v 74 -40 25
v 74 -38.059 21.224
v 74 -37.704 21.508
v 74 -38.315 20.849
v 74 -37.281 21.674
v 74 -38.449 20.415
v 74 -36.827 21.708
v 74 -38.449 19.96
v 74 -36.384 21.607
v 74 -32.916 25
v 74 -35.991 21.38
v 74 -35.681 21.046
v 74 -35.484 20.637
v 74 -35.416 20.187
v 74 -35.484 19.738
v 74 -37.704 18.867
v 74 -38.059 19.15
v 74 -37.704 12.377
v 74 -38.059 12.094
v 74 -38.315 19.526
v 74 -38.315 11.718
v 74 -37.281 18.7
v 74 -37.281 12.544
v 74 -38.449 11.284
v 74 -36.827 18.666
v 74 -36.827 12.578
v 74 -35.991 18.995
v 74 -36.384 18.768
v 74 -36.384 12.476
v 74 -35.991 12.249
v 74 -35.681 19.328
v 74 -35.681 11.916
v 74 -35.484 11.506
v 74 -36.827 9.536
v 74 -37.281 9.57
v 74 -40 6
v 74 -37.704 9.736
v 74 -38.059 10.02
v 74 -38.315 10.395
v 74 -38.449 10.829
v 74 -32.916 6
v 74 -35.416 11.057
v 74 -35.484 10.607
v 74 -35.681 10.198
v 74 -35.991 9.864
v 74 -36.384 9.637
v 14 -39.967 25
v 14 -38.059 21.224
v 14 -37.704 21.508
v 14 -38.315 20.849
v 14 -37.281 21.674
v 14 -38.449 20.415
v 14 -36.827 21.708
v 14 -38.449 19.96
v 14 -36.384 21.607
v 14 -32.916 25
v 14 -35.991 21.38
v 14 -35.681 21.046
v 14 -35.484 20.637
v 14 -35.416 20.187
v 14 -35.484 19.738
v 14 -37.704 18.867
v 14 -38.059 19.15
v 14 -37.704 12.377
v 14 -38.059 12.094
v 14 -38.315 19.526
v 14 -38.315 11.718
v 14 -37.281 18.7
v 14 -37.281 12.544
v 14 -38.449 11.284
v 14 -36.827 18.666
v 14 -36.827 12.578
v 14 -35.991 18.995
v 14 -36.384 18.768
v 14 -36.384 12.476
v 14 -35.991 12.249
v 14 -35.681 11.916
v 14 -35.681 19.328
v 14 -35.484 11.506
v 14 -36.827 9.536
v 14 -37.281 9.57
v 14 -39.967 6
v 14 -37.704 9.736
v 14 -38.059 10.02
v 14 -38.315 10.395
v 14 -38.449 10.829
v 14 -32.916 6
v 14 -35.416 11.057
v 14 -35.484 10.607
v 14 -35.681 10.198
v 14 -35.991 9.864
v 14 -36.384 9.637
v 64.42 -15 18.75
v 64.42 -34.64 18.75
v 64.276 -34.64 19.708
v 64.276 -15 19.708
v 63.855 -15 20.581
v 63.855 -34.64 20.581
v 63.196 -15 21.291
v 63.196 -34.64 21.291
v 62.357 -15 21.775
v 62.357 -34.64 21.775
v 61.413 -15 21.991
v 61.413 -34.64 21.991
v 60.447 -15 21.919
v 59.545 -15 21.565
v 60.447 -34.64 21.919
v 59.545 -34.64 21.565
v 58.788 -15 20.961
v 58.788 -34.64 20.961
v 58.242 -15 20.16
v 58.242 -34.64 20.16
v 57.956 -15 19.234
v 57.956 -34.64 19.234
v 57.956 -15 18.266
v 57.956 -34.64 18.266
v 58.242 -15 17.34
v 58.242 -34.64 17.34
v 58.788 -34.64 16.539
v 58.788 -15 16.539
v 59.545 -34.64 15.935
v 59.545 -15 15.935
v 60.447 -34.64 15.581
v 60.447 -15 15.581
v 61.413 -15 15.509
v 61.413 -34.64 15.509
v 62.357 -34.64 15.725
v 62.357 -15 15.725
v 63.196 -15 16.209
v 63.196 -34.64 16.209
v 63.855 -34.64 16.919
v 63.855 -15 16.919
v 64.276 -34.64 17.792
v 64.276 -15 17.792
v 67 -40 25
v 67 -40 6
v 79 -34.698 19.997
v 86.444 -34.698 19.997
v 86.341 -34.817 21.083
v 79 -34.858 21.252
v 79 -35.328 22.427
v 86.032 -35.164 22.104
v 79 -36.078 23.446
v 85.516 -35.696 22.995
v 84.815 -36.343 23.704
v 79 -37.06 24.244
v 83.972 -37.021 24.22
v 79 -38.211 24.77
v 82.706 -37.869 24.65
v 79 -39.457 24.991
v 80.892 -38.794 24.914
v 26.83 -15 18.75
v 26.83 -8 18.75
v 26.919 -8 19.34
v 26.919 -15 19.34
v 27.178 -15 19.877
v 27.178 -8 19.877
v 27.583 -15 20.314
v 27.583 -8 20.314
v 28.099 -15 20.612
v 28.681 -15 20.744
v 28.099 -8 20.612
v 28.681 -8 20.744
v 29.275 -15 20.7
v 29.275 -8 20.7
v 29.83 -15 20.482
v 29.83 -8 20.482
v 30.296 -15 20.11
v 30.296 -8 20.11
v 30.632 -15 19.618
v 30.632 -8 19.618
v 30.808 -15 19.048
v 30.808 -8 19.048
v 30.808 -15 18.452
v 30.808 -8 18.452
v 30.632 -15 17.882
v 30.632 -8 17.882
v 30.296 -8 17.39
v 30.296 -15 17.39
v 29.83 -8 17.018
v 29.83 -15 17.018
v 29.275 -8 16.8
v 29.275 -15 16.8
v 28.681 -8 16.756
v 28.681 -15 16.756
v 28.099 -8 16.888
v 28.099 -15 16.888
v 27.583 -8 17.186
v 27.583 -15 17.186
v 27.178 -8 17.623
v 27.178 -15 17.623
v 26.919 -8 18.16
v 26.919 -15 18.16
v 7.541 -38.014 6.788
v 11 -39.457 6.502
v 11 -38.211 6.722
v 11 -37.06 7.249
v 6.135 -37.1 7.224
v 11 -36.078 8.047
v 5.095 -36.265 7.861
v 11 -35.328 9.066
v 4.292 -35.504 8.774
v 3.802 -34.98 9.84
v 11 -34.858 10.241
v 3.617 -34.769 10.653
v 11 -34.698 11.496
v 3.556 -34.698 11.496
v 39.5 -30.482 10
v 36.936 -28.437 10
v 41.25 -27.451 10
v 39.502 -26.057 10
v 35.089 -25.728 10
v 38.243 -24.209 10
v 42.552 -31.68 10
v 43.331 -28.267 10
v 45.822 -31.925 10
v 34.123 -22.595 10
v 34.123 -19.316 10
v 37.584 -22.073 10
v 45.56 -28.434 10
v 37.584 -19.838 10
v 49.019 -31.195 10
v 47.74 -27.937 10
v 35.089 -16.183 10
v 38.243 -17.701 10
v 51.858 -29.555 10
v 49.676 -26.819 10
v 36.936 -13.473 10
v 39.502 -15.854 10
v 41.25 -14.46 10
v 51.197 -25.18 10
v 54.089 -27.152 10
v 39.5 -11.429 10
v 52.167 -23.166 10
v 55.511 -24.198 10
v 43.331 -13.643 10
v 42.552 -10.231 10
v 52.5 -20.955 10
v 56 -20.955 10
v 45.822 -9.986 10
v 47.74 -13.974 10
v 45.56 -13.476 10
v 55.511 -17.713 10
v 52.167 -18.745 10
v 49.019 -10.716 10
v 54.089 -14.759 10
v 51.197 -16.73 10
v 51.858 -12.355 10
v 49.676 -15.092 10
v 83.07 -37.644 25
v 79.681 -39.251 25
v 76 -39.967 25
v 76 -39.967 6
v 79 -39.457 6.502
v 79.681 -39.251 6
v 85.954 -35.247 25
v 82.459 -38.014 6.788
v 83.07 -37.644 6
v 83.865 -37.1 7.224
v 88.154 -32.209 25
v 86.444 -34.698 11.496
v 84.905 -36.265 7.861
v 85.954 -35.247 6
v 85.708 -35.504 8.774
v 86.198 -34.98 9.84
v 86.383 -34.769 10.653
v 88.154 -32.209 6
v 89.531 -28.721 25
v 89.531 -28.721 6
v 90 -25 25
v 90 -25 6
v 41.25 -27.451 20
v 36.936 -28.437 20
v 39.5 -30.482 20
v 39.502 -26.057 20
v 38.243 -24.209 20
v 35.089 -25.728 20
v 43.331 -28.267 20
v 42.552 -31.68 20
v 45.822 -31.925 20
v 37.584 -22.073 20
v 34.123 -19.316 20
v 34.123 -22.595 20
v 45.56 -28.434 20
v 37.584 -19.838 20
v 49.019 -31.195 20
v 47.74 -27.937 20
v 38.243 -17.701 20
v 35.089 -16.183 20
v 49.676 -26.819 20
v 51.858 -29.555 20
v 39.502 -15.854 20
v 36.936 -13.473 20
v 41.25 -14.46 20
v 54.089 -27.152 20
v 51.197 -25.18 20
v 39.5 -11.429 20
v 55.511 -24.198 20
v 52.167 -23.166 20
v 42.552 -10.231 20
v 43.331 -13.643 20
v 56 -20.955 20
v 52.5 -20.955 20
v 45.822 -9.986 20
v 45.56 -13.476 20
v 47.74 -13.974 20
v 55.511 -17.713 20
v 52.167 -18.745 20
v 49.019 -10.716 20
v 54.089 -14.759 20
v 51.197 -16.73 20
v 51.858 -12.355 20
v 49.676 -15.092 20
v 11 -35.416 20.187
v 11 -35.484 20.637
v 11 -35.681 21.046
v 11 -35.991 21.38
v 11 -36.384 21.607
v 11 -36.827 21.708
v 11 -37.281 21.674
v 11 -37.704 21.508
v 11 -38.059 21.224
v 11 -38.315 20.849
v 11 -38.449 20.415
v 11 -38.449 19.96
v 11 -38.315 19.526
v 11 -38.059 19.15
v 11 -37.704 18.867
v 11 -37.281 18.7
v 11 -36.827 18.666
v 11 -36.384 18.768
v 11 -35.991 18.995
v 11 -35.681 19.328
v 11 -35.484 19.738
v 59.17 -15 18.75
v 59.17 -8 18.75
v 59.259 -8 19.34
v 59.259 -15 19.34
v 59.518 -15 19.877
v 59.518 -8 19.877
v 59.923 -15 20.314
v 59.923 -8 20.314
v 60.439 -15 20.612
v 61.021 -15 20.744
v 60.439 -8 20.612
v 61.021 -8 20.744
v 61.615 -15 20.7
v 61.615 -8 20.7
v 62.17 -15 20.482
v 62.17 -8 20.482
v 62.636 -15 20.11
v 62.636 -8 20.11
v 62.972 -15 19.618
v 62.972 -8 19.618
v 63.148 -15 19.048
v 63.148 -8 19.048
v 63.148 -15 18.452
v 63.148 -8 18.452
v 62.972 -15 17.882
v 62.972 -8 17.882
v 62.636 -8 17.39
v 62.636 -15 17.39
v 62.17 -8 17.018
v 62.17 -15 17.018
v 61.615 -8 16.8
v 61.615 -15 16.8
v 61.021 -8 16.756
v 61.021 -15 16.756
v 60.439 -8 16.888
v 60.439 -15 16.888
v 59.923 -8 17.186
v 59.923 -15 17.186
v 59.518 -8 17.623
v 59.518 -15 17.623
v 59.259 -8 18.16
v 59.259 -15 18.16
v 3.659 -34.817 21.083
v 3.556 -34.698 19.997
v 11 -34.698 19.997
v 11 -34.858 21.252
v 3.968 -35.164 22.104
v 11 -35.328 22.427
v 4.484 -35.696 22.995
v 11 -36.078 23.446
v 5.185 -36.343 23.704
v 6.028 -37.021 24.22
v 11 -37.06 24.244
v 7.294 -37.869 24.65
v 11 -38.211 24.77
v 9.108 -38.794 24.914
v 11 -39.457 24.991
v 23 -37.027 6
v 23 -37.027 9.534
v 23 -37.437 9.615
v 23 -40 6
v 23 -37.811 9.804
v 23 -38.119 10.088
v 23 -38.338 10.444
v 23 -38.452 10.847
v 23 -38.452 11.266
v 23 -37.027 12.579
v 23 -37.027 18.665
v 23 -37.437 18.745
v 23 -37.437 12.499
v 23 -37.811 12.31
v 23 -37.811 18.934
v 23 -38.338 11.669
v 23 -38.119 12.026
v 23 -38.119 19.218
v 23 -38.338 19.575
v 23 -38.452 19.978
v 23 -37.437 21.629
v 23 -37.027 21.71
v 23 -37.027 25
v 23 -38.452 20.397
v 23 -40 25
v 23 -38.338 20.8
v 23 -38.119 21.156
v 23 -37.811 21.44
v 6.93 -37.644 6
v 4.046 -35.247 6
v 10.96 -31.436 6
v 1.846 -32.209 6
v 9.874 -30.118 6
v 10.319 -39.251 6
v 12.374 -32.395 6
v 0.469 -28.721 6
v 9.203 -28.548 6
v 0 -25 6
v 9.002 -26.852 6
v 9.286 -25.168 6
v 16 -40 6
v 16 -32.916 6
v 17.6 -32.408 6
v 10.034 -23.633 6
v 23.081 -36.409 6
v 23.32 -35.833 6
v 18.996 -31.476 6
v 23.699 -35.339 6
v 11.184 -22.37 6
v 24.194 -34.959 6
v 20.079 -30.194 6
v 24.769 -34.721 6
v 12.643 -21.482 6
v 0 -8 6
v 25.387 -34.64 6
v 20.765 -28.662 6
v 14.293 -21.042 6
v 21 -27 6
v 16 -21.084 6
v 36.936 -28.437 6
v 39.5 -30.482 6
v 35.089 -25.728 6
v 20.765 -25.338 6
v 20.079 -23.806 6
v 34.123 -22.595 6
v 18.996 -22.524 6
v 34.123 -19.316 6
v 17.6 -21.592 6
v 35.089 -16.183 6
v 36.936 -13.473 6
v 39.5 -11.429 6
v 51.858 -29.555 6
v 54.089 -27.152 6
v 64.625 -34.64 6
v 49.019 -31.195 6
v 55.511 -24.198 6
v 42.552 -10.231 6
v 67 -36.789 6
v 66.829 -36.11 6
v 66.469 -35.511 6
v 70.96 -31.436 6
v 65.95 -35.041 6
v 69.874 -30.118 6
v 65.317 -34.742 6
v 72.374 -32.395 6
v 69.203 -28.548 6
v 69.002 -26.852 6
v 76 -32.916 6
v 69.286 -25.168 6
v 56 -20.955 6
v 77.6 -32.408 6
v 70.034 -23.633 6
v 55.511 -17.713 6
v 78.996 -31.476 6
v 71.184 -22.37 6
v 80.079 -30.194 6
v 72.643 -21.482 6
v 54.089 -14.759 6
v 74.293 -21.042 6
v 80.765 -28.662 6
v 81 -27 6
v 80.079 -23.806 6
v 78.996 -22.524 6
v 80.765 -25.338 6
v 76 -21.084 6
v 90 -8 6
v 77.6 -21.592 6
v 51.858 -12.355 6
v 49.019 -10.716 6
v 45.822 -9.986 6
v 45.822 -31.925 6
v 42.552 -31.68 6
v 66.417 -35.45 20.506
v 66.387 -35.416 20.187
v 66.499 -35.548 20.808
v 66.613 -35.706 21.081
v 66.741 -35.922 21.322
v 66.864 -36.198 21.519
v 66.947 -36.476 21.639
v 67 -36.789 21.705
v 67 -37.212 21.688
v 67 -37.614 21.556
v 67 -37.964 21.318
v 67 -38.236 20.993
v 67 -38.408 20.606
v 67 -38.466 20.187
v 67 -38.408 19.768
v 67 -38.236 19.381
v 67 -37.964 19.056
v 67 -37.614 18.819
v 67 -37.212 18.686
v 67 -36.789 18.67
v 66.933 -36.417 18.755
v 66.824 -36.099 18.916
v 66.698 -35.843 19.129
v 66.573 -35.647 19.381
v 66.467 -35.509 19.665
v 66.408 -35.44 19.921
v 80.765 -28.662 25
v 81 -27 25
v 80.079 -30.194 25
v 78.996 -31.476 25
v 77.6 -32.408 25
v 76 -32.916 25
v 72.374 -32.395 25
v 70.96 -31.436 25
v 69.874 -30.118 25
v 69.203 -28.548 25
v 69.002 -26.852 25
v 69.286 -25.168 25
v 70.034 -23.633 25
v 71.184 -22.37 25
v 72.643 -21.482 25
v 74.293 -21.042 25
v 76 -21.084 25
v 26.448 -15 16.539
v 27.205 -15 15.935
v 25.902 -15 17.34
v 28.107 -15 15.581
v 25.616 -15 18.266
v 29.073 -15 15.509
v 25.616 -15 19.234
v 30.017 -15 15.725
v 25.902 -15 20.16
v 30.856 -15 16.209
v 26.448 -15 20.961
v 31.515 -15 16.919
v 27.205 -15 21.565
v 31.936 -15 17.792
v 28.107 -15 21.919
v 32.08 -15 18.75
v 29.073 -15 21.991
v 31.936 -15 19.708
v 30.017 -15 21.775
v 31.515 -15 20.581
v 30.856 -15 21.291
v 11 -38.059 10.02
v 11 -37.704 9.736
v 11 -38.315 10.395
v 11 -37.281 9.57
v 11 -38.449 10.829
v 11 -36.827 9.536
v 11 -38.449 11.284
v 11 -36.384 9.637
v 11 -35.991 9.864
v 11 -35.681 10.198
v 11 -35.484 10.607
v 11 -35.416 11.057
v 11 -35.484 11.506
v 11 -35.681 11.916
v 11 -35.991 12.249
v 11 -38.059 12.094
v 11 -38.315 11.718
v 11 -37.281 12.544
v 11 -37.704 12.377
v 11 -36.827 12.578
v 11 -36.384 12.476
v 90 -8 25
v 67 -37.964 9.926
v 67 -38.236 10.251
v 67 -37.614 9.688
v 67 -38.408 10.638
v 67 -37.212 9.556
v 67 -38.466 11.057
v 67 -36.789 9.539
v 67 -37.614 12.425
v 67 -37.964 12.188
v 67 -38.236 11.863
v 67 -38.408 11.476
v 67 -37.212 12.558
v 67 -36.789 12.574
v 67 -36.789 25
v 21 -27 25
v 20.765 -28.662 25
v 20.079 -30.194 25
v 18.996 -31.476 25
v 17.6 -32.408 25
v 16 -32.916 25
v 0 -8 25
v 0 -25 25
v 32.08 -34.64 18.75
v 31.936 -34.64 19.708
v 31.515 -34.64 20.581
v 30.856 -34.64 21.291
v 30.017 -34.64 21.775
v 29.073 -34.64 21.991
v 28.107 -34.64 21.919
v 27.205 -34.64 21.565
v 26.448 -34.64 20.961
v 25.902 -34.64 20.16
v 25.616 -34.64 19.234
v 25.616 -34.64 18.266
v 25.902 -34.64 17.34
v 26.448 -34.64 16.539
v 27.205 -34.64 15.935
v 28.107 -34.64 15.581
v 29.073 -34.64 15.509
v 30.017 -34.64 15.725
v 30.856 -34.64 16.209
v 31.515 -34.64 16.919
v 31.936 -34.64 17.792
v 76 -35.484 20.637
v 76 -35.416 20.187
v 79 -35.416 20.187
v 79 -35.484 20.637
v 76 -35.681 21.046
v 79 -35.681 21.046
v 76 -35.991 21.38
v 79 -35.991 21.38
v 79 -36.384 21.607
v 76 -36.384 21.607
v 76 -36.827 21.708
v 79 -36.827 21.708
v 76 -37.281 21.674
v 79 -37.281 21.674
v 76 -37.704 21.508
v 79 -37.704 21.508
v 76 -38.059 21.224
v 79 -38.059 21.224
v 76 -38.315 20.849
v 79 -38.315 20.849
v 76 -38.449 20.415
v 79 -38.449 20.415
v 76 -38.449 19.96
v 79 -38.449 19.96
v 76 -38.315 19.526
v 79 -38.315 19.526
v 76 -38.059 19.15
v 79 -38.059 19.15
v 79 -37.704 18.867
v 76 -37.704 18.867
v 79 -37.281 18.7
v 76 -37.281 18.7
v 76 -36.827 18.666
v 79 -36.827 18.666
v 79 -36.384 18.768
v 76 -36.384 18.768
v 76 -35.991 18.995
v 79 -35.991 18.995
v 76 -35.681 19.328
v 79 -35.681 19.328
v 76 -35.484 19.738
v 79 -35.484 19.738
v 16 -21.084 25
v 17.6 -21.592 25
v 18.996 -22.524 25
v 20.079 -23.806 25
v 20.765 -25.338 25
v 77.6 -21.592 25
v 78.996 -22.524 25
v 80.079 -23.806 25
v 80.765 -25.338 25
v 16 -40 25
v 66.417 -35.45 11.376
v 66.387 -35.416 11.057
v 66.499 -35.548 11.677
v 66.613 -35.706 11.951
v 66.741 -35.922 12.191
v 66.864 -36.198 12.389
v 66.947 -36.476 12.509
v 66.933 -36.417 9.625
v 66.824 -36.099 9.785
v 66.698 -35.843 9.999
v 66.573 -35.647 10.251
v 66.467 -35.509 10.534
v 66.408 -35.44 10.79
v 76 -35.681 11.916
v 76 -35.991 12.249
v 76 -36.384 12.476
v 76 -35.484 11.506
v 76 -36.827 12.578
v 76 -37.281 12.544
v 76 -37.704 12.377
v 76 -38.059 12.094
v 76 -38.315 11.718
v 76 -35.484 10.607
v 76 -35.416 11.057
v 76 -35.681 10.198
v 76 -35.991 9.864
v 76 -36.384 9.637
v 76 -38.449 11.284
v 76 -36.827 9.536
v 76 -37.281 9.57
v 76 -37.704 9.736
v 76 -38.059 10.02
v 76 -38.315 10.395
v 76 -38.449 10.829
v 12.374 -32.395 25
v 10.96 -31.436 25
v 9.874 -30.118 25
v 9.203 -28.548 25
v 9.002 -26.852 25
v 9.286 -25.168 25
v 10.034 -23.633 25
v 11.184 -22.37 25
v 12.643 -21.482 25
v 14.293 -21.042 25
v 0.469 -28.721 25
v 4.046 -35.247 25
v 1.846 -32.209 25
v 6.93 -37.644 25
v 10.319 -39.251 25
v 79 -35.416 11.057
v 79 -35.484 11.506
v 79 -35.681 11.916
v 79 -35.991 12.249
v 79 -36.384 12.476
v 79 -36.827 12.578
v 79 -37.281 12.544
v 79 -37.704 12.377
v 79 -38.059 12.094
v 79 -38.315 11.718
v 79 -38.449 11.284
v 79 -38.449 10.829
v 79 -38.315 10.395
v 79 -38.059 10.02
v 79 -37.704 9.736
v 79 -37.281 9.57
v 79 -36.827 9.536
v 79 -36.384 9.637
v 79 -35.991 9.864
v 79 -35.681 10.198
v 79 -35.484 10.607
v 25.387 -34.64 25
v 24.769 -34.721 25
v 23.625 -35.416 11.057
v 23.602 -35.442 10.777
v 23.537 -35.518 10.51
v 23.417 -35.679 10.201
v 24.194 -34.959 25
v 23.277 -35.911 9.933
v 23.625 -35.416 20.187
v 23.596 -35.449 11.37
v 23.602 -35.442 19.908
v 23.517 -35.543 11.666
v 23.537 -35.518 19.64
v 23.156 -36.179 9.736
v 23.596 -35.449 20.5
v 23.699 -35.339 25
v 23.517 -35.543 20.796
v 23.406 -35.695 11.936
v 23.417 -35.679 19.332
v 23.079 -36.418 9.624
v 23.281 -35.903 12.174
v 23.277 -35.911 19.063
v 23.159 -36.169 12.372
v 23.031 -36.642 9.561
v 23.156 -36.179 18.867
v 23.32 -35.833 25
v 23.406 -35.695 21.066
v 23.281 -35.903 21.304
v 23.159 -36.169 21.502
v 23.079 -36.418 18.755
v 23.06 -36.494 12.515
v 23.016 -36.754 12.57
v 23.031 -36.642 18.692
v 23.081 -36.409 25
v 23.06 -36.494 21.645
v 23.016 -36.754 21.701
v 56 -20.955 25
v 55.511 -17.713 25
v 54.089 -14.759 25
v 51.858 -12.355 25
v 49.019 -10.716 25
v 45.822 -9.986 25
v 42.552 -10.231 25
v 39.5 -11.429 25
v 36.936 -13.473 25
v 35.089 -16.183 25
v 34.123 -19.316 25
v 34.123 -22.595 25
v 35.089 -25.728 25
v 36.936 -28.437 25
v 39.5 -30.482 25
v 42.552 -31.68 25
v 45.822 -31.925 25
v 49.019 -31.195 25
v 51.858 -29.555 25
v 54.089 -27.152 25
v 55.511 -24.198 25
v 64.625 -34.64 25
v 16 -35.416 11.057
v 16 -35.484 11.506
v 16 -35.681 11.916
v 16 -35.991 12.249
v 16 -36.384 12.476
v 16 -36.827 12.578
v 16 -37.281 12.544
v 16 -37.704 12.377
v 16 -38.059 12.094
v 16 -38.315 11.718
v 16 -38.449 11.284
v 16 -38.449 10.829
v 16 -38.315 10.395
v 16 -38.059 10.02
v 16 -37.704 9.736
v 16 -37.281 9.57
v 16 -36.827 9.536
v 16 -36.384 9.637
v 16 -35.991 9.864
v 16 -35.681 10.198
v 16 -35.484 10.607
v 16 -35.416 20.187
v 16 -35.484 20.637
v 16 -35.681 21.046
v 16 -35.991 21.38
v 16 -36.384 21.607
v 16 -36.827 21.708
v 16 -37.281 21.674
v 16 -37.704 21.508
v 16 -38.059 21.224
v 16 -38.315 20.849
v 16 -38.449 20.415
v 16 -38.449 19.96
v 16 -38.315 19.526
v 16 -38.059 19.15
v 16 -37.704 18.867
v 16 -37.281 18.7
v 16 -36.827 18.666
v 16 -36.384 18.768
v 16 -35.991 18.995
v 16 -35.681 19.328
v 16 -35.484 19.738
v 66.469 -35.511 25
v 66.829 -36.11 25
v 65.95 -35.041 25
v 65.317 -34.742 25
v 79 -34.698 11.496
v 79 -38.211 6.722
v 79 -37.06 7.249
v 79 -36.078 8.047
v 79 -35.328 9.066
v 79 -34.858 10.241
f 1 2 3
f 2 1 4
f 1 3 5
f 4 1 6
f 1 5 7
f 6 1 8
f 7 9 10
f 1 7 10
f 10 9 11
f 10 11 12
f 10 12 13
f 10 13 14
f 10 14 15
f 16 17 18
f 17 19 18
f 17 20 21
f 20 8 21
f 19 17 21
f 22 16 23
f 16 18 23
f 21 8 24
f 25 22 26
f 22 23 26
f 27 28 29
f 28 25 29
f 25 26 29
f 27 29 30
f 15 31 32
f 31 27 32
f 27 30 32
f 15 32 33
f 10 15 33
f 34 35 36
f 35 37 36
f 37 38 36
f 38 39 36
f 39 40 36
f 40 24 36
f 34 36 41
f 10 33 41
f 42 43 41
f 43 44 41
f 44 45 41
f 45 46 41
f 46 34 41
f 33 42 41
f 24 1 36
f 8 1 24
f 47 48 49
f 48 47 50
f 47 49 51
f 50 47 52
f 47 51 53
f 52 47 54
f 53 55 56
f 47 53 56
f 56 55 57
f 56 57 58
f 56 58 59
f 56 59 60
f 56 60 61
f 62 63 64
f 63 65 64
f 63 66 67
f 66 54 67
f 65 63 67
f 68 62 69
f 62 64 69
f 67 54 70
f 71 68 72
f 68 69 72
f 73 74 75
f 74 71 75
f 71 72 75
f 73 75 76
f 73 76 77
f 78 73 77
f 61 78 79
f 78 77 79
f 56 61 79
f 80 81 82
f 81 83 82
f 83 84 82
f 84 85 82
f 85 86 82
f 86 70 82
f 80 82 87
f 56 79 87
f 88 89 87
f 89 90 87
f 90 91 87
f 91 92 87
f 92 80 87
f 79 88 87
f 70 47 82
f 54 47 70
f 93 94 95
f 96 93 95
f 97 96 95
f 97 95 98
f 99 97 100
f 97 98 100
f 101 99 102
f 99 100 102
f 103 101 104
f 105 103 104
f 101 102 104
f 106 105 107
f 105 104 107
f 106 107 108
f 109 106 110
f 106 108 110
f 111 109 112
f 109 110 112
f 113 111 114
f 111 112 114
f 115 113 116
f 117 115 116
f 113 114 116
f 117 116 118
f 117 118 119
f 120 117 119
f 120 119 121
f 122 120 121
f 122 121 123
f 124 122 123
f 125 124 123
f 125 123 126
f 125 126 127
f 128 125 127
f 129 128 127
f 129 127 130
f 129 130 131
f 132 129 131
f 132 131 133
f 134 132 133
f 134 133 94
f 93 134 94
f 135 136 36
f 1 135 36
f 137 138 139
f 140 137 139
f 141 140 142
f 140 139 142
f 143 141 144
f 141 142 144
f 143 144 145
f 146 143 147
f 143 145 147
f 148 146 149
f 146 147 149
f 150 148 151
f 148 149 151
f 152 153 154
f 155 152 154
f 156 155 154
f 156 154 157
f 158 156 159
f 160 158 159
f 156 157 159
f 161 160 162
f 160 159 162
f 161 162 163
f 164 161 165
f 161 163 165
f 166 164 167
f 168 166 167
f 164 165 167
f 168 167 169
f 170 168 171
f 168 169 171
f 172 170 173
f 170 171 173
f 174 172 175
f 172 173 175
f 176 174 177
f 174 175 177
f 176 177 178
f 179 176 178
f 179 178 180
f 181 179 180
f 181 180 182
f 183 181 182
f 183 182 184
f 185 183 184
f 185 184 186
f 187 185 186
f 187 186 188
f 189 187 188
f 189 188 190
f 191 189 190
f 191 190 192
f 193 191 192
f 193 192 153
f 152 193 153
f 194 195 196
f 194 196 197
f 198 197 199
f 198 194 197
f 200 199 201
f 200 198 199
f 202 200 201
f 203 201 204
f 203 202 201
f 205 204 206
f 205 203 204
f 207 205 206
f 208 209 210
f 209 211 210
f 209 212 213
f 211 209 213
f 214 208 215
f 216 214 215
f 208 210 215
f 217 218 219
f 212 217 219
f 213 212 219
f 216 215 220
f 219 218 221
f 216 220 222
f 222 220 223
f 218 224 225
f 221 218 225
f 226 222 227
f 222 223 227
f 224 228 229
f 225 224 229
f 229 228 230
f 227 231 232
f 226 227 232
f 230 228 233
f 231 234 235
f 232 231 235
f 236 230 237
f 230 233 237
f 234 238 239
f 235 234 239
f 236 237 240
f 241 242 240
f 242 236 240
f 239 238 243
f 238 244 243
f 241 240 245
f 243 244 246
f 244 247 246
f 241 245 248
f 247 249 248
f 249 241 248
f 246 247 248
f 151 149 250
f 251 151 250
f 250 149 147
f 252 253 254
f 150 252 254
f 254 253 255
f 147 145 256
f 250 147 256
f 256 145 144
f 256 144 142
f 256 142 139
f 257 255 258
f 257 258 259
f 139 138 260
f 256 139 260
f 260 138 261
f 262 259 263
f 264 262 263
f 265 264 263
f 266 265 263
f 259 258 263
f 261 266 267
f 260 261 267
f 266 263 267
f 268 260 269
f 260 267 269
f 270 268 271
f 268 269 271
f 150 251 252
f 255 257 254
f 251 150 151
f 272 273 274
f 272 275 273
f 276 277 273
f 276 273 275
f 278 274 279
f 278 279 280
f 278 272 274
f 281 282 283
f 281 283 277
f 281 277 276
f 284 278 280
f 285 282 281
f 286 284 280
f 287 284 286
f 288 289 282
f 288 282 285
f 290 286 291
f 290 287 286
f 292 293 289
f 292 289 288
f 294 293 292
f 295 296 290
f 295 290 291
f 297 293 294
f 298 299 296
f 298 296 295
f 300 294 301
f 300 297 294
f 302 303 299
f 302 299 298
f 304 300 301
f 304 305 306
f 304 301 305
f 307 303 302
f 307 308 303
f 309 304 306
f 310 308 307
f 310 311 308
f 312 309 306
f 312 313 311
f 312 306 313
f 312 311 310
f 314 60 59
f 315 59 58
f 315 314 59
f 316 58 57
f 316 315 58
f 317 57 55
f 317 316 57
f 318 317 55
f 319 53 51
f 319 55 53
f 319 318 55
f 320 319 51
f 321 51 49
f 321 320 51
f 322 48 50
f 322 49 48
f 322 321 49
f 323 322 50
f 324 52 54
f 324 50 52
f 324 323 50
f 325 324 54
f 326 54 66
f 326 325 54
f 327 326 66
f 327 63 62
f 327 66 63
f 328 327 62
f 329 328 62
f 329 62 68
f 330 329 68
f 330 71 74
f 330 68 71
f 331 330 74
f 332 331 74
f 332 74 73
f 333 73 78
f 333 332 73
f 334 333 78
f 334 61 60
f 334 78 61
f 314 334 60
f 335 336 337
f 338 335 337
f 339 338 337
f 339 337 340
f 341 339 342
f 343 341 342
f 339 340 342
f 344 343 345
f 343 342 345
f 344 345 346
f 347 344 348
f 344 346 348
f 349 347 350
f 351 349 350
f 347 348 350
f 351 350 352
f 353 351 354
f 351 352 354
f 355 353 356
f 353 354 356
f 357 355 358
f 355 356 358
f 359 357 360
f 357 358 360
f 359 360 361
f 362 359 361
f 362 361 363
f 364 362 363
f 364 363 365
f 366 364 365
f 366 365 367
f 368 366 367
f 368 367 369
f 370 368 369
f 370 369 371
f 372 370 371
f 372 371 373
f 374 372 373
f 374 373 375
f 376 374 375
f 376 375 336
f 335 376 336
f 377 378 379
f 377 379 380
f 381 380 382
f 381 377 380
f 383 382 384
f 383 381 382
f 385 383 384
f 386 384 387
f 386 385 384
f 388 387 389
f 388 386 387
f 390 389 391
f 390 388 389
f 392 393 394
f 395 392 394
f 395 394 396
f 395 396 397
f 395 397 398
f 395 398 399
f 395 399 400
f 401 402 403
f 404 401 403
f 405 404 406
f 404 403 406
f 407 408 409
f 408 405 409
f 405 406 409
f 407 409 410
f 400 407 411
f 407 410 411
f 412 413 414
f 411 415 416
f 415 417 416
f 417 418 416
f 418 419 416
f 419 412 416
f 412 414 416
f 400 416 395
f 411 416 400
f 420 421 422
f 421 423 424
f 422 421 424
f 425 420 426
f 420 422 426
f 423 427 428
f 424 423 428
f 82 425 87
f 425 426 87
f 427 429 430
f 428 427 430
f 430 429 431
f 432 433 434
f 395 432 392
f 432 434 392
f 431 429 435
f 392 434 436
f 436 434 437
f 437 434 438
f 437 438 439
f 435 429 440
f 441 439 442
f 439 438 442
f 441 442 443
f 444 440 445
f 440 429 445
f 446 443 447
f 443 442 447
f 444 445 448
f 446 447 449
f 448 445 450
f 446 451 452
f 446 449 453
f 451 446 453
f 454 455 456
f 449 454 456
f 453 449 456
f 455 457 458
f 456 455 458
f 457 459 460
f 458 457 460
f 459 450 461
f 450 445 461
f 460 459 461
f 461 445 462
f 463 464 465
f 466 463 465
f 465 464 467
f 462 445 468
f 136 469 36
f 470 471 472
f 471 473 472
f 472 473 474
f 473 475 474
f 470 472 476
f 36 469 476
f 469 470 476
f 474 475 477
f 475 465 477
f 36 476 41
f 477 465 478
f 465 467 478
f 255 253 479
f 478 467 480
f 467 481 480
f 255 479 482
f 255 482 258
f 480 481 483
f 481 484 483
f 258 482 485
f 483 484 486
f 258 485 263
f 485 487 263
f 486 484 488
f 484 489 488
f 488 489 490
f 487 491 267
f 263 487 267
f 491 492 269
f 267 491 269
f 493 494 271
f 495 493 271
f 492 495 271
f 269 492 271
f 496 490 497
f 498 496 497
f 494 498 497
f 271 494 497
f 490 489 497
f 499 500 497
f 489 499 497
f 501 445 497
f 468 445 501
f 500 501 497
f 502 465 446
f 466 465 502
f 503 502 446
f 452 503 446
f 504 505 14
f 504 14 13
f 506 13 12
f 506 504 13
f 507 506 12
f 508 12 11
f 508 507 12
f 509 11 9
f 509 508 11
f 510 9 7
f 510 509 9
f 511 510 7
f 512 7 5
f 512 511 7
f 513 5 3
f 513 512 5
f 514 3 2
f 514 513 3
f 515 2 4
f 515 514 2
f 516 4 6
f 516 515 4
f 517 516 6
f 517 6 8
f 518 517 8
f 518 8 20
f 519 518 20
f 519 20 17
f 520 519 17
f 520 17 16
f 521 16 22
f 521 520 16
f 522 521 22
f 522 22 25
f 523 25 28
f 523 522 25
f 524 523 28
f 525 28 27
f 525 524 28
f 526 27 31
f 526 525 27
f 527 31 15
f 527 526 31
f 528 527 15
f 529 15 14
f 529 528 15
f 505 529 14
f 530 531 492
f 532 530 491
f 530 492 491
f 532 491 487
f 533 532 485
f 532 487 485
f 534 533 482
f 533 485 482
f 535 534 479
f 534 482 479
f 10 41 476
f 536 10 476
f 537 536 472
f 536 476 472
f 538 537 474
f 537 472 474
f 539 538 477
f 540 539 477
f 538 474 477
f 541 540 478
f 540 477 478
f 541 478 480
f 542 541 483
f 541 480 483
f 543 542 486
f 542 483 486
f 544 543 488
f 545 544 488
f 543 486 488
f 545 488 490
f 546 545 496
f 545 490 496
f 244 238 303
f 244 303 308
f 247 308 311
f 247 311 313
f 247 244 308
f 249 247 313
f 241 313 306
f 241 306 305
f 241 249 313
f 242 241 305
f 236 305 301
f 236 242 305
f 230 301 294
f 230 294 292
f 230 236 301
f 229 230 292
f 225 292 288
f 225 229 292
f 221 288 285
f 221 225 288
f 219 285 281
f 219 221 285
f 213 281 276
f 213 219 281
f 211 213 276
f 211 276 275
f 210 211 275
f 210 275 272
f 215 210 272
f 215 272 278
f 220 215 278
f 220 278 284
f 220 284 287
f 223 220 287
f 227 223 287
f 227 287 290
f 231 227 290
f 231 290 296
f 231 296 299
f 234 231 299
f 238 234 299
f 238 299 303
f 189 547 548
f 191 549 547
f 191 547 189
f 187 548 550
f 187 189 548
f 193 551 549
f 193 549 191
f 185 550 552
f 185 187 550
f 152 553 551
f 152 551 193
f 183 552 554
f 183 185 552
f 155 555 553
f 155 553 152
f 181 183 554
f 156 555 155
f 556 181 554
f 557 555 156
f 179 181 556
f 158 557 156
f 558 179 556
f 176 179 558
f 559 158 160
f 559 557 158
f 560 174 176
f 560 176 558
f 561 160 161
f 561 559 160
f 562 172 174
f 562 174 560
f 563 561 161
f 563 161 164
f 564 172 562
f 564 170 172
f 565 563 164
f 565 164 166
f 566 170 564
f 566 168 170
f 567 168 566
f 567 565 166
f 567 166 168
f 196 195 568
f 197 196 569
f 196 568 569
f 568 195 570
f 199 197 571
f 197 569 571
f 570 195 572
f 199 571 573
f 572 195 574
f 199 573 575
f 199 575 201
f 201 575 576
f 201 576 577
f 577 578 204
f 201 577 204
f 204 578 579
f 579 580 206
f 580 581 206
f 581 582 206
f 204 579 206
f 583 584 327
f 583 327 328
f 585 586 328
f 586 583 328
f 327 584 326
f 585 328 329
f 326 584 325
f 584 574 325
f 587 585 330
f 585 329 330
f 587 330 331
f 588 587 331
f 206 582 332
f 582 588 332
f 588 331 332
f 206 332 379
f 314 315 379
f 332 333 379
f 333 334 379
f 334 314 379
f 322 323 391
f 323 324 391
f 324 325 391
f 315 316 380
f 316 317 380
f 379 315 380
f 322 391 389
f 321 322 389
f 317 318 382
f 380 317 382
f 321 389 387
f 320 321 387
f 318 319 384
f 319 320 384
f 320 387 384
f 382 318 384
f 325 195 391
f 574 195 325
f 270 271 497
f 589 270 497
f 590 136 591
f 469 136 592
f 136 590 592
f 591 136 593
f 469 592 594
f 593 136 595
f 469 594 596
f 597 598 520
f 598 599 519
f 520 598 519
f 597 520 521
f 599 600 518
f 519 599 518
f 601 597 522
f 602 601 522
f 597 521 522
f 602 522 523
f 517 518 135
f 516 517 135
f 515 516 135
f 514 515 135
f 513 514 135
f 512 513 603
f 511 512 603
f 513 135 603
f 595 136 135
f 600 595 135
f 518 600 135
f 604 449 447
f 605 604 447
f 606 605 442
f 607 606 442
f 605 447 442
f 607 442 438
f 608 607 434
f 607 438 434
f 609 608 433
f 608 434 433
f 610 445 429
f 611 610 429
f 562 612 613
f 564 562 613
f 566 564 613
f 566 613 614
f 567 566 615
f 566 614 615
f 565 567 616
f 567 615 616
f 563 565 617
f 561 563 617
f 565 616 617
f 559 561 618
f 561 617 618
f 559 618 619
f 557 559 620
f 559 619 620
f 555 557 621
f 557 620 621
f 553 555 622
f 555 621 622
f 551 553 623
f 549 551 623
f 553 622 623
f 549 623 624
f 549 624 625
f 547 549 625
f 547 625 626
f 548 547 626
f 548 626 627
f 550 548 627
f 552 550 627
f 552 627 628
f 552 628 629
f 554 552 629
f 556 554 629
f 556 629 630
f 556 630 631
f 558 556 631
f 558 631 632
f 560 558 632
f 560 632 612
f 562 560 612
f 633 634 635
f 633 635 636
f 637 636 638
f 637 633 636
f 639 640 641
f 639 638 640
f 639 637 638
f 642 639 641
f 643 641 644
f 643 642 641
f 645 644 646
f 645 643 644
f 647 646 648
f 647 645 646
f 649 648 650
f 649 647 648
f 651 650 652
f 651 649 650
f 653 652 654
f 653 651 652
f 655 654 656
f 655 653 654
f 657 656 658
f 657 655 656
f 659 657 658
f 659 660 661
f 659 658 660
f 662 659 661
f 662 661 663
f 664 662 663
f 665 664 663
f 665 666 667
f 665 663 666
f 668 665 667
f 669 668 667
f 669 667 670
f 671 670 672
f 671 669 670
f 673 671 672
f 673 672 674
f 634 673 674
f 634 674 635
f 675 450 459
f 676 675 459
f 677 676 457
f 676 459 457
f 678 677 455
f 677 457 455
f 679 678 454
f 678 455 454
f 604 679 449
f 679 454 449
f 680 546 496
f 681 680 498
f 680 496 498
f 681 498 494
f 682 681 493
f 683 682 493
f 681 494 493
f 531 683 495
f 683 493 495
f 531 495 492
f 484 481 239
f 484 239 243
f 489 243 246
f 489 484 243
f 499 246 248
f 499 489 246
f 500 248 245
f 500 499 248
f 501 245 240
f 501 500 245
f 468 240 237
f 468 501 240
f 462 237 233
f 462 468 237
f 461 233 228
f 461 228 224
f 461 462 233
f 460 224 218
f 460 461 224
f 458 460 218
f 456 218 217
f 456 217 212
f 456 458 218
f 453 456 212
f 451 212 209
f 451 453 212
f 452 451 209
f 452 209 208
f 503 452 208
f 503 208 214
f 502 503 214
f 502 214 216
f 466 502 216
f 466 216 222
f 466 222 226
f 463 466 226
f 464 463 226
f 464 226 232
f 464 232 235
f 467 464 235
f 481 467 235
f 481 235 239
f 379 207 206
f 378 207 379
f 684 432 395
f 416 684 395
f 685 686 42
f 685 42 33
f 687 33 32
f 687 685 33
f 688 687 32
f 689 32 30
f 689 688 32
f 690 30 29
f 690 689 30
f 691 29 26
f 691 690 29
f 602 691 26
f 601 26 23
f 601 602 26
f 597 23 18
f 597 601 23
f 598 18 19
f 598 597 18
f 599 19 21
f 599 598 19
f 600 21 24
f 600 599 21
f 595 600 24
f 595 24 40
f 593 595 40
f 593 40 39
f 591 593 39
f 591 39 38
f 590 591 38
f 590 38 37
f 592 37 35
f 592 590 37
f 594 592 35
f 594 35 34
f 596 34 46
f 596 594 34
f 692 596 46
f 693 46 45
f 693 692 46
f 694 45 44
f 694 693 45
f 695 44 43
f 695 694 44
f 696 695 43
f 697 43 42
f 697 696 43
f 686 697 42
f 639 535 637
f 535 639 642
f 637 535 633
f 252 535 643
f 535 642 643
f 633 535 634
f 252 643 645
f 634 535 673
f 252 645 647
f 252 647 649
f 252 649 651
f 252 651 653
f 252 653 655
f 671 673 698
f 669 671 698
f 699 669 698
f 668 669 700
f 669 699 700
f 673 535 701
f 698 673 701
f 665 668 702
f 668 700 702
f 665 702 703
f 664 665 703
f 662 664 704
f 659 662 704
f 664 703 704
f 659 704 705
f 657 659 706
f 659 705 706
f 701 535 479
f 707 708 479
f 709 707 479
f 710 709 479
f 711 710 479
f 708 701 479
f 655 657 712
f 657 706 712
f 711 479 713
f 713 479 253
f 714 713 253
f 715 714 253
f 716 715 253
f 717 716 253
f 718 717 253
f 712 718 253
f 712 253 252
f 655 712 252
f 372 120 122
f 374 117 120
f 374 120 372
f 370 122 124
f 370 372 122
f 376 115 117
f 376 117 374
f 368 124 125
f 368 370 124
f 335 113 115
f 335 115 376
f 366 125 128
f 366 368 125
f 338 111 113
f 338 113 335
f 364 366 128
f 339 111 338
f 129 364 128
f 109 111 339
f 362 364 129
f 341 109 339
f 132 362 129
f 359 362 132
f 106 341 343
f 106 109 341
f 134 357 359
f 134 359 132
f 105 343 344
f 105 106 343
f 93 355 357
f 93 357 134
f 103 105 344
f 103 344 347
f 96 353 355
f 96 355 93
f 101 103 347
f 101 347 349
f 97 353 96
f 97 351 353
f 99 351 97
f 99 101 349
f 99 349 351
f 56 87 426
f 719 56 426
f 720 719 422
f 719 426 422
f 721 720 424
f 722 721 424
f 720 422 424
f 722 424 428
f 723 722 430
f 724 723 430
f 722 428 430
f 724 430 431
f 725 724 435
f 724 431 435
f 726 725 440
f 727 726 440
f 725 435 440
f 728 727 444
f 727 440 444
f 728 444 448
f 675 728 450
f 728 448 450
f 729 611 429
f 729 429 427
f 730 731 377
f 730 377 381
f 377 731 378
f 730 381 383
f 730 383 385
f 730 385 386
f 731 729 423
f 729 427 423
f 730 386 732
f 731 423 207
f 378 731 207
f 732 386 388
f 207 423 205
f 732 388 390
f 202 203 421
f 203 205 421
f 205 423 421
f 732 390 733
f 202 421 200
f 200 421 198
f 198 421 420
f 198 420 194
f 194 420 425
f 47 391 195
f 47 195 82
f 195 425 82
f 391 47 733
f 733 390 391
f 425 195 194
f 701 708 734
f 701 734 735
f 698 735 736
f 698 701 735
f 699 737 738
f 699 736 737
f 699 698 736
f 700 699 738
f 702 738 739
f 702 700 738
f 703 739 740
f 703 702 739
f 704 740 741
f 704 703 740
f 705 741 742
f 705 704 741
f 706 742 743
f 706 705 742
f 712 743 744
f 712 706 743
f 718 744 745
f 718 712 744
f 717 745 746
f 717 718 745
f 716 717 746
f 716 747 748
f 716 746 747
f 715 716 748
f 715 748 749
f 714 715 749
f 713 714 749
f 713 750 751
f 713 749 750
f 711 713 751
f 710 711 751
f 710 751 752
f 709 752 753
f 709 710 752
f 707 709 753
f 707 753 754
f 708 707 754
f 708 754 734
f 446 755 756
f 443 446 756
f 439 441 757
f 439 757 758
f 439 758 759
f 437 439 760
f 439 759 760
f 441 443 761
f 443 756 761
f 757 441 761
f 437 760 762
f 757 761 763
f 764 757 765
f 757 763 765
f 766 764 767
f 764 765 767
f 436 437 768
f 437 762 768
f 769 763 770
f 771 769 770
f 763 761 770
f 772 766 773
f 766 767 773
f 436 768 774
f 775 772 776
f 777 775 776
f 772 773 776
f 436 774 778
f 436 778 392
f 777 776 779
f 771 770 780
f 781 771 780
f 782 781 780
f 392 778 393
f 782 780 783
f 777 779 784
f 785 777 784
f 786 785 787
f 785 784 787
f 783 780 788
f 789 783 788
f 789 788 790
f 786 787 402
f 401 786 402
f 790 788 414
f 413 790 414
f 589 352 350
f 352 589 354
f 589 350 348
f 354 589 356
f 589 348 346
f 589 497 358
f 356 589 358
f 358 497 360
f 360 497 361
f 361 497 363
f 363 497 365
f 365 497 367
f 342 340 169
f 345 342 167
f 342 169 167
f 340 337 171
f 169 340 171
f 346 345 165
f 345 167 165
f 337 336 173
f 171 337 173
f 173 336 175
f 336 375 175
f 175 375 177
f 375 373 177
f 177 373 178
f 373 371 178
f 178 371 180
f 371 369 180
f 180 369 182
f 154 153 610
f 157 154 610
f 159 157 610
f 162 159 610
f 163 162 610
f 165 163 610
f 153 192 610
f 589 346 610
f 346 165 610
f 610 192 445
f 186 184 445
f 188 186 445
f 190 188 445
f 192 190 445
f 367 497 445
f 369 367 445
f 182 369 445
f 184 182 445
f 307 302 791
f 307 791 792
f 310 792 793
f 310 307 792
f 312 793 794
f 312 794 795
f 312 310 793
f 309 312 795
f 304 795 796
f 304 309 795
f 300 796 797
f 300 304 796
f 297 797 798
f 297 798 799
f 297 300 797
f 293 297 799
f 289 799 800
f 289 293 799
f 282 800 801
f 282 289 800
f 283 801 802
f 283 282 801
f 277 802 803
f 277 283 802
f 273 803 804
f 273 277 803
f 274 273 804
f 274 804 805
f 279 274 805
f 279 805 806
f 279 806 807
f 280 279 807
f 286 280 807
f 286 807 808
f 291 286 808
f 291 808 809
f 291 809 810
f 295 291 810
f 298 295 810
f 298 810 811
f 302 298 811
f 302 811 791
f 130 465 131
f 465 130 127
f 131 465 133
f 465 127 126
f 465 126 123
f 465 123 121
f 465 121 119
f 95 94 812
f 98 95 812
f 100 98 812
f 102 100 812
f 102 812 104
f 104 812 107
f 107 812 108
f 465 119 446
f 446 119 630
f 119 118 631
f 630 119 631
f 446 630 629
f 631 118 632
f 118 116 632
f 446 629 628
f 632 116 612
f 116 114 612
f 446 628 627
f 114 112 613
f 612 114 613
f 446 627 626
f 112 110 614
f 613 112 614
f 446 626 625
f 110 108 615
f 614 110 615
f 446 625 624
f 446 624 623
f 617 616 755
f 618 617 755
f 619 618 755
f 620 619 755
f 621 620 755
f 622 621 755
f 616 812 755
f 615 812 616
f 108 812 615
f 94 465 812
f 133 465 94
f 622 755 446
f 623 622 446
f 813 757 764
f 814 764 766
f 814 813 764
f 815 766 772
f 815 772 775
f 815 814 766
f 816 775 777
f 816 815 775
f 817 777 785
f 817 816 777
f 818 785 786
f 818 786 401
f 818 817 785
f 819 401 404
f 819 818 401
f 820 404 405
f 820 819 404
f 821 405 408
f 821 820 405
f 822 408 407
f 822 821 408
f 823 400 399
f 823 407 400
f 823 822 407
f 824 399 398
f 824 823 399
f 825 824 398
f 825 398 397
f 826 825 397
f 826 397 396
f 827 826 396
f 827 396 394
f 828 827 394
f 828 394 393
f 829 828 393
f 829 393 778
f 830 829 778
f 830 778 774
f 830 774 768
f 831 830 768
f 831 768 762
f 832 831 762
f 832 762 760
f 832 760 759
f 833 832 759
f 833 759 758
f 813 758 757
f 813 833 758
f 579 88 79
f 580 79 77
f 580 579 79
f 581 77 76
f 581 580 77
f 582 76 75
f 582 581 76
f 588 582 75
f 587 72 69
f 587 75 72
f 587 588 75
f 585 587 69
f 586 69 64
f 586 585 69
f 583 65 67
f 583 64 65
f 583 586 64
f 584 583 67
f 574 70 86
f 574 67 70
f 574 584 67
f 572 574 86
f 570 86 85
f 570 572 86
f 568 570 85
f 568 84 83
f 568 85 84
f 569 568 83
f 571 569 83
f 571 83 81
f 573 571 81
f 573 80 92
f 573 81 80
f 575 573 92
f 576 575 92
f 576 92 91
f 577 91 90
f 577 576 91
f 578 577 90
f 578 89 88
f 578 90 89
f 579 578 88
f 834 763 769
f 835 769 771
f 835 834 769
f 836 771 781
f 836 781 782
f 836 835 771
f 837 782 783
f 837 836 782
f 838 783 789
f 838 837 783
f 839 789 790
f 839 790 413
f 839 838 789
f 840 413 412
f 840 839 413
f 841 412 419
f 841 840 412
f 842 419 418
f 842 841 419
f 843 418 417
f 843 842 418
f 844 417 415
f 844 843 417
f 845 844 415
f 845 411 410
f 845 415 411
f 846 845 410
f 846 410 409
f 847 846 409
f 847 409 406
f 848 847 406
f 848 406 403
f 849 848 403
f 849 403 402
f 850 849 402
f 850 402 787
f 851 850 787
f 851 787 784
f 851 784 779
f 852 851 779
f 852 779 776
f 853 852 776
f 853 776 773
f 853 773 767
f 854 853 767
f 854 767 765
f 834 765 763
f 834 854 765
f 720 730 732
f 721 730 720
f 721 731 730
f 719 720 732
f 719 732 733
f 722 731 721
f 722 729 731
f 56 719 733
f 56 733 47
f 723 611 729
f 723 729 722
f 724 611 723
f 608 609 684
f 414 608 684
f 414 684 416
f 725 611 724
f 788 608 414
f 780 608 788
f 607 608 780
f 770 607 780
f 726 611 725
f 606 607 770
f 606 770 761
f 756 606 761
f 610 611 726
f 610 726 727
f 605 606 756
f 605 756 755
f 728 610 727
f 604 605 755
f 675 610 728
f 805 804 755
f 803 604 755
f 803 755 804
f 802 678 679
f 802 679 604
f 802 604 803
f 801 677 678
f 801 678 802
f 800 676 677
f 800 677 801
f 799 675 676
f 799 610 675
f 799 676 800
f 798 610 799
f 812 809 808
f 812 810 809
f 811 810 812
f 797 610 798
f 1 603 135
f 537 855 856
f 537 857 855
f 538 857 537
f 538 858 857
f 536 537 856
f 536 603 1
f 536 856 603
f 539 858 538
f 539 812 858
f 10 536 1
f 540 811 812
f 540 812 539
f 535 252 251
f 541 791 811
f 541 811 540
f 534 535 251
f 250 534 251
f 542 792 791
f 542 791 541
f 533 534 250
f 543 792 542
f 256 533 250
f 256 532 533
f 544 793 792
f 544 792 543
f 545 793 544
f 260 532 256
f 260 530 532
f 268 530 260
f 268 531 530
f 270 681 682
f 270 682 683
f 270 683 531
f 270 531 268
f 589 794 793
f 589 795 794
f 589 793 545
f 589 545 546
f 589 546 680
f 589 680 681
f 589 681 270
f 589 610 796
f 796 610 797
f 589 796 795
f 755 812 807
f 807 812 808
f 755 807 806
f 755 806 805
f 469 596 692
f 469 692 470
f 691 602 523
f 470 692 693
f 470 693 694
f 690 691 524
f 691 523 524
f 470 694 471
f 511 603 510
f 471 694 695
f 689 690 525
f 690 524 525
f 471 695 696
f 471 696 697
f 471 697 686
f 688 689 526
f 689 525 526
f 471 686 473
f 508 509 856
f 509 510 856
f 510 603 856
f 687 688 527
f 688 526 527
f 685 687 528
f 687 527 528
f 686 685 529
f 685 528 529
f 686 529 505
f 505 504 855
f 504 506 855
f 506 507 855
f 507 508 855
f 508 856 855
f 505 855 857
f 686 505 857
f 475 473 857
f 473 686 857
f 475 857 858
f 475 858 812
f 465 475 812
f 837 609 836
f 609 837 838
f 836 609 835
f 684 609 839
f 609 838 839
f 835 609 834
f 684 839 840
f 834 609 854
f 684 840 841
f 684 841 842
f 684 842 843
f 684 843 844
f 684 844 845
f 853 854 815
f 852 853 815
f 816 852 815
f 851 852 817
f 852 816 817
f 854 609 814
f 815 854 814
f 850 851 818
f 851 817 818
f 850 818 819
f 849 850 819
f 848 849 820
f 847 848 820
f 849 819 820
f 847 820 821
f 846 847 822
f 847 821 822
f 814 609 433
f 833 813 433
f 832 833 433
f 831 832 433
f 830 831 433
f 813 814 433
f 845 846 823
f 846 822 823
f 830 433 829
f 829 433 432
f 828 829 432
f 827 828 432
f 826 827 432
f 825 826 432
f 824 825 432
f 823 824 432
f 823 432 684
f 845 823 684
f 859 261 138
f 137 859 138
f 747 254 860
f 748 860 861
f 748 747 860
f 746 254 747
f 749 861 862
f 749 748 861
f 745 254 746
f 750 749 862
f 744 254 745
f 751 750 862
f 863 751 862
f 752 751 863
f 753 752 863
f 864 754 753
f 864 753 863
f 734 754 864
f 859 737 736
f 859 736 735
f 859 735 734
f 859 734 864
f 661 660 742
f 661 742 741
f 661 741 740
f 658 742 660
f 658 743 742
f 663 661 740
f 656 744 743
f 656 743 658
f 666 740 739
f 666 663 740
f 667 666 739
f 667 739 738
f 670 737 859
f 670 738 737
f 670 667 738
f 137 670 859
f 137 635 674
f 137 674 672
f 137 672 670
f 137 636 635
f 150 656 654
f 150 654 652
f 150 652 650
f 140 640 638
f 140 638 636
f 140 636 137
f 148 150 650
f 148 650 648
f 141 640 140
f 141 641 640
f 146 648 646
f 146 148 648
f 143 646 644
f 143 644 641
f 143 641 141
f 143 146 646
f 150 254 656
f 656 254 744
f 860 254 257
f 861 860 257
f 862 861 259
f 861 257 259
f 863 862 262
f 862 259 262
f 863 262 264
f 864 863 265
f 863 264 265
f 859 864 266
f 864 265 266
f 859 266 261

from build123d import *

# Parameters (mm, degrees)
F0_R      = 11
F1_DEPTH  = 25
F3_R      = 1.525
F4_DEPTH  = 105.2
F5_DEPTH  = 11
F7_DEPTH  = 11
F0_R_2    = 7.5
F8_DEPTH  = 20
F9_DEPTH  = 5
F10_R     = 2
F11_DEPTH = 10
F13_DEPTH = 25.0010001
F14_DEPTH = 6
F15_DEPTH = 10
F16_R     = 3.25
F17_DEPTH = 25


# Not quite as in the source:
# - a feature names something its author has since deleted; it is built from what else it names


with BuildPart() as f1:
    # F0 (on Top) → F1 (new body)
    with BuildSketch(Plane.XY):
        with BuildLine():
            Line((90, -8), (0, -8))
            Line((0, -8), (0, -25))
            ThreePointArc((0, -25), (4.0455488499, -35.246950766), (14, -39.9666295471))
            Line((14, -39.9666295471), (14, -32.9160797831))
            ThreePointArc((14, -32.9160797831), (9, -27), (14, -21.0839202169))
            Line((14, -21.0839202169), (14, -14))
            Line((14, -14), (16, -14))
            Line((16, -14), (16, -21.0839202169))
            ThreePointArc((16, -21.0839202169), (19.582575695, -23.1270166538), (21, -27))
            ThreePointArc((21, -27), (19.582575695, -30.8729833462), (16, -32.9160797831))
            Line((16, -32.9160797831), (16, -40))
            Line((16, -40), (74, -40))
            Line((74, -40), (74, -32.9160797831))
            ThreePointArc((74, -32.9160797831), (69, -27), (74, -21.0839202169))
            Line((74, -21.0839202169), (74, -14))
            Line((74, -14), (76, -14))
            Line((76, -14), (76, -21.0839202169))
            ThreePointArc((76, -21.0839202169), (79.582575695, -23.1270166538), (81, -27))
            ThreePointArc((81, -27), (79.582575695, -30.8729833462), (76, -32.9160797831))
            Line((76, -32.9160797831), (76, -39.9666295471))
            ThreePointArc((76, -39.9666295471), (85.9544511501, -35.246950766), (90, -25))
            Line((90, -25), (90, -8))
        make_face()
        with Locations((45, -20.9553470761)):
            Circle(F0_R, mode=Mode.SUBTRACT)
        with BuildLine():
            Line((14, -14), (14, -21.0839202169))
            ThreePointArc((14, -21.0839202169), (15, -21), (16, -21.0839202169))
            Line((16, -21.0839202169), (16, -14))
            Line((16, -14), (14, -14))
        make_face()
        with BuildLine():
            ThreePointArc((74, -21.0839202169), (75, -21), (76, -21.0839202169))
            Line((76, -21.0839202169), (76, -14))
            Line((76, -14), (74, -14))
            Line((74, -14), (74, -21.0839202169))
        make_face()
    extrude(amount=F1_DEPTH)

    # F3 (on Right) → F4 (cut)
    with BuildSketch(Plane.YZ):
        with Locations((-36.9413755834, 11.0567829106)):
            Circle(F3_R)
        with Locations((-36.9413755834, 20.1872170437)):
            Circle(F3_R)
    extrude(amount=F4_DEPTH, mode=Mode.SUBTRACT)

    # F3 (on Right) → F5 (cut)
    with BuildSketch(Plane.YZ):
        with BuildLine():
            Line((-39.7998355329, 24.9966811389), (-39.7998355329, 6.4961747266))
            Line((-39.7998355329, 6.4961747266), (-39.6976853907, 6.4961747266))
            ThreePointArc((-39.6976853907, 6.4961747266), (-36.1621514848, 7.9606408207), (-34.6976853907, 11.4961747266))
            Line((-34.6976853907, 11.4961747266), (-34.6976853907, 19.9966811389))
            ThreePointArc((-34.6976853907, 19.9966811389), (-36.1621514848, 23.5322150448), (-39.6976853907, 24.9966811389))
            Line((-39.6976853907, 24.9966811389), (-39.7998355329, 24.9966811389))
        make_face()
        with Locations((-36.9413755834, 11.0567829106)):
            Circle(F3_R, mode=Mode.SUBTRACT)
        with Locations((-36.9413755834, 20.1872170437)):
            Circle(F3_R, mode=Mode.SUBTRACT)
    extrude(amount=F5_DEPTH, mode=Mode.SUBTRACT)

    # F6 (on offset) → F7 (cut)
    with BuildSketch(Plane.YZ.offset(90)):
        with BuildLine():
            Line((-39.7998355329, 24.9966811389), (-39.7998355329, 6.4961747266))
            Line((-39.7998355329, 6.4961747266), (-39.6976853907, 6.4961747266))
            ThreePointArc((-39.6976853907, 6.4961747266), (-36.1621514848, 7.9606408207), (-34.6976853907, 11.4961747266))
            Line((-34.6976853907, 11.4961747266), (-34.6976853907, 19.9966811389))
            ThreePointArc((-34.6976853907, 19.9966811389), (-36.1621514848, 23.5322150448), (-39.6976853907, 24.9966811389))
            Line((-39.6976853907, 24.9966811389), (-39.7998355329, 24.9966811389))
        make_face()
    extrude(amount=-F7_DEPTH, mode=Mode.SUBTRACT)

    # F0 (on Top) → F8 (join)
    with BuildSketch(Plane.XY):
        with Locations((45, -20.9553470761)):
            Circle(F0_R)
        with Locations((45, -20.9553470761)):
            Circle(F0_R_2, mode=Mode.SUBTRACT)
    extrude(amount=F8_DEPTH)

    # F0 (on Top) → F9 (cut)
    with BuildSketch(Plane.XY):
        with Locations((45, -20.9553470761)):
            Circle(F0_R)
        with Locations((45, -20.9553470761)):
            Circle(F0_R_2, mode=Mode.SUBTRACT)
    extrude(amount=F9_DEPTH, mode=Mode.SUBTRACT)

    # F10 (on face) → F11 (cut)
    with BuildSketch(Plane(origin=(0, -8, 0), x_dir=(-1, 0, 0), z_dir=(0, 1, 0))):
        with Locations((-28.83, 18.75)):
            Circle(F10_R)
        with Locations((-61.17, 18.75)):
            Circle(F10_R)
    extrude(amount=-F11_DEPTH, mode=Mode.SUBTRACT)

    # F12 (on face) → F13 (cut, through all)
    with BuildSketch(Plane.XY.offset(25)):
        with BuildLine():
            Line((45, -40), (45, -34.6395410597))
            Line((45, -34.6395410597), (25.387, -34.6395410597))
            ThreePointArc((25.387, -34.6395410597), (23.6991374304, -35.338675856), (23, -37.0265373344))
            Line((23, -37.0265373344), (23, -40))
            Line((23, -40), (45, -40))
        make_face()
        with BuildLine():
            ThreePointArc((67, -36.7889047916), (66.2265029782, -35.2566531011), (64.6248583192, -34.6395410597))
            Line((64.6248583192, -34.6395410597), (45, -34.6395410597))
            Line((45, -34.6395410597), (45, -40))
            Line((45, -40), (67, -40))
            Line((67, -40), (67, -36.7889047916))
        make_face()
    extrude(amount=-F13_DEPTH, mode=Mode.SUBTRACT)

    # F0 (on Top) → F14 (cut)
    with BuildSketch(Plane.XY):
        with BuildLine():
            Line((90, -8), (0, -8))
            Line((0, -8), (0, -25))
            ThreePointArc((0, -25), (4.0455488499, -35.246950766), (14, -39.9666295471))
            Line((14, -39.9666295471), (14, -32.9160797831))
            ThreePointArc((14, -32.9160797831), (9, -27), (14, -21.0839202169))
            Line((14, -21.0839202169), (14, -14))
            Line((14, -14), (16, -14))
            Line((16, -14), (16, -21.0839202169))
            ThreePointArc((16, -21.0839202169), (19.582575695, -23.1270166538), (21, -27))
            ThreePointArc((21, -27), (19.582575695, -30.8729833462), (16, -32.9160797831))
            Line((16, -32.9160797831), (16, -40))
            Line((16, -40), (74, -40))
            Line((74, -40), (74, -32.9160797831))
            ThreePointArc((74, -32.9160797831), (69, -27), (74, -21.0839202169))
            Line((74, -21.0839202169), (74, -14))
            Line((74, -14), (76, -14))
            Line((76, -14), (76, -21.0839202169))
            ThreePointArc((76, -21.0839202169), (79.582575695, -23.1270166538), (81, -27))
            ThreePointArc((81, -27), (79.582575695, -30.8729833462), (76, -32.9160797831))
            Line((76, -32.9160797831), (76, -39.9666295471))
            ThreePointArc((76, -39.9666295471), (85.9544511501, -35.246950766), (90, -25))
            Line((90, -25), (90, -8))
        make_face()
        with Locations((45, -20.9553470761)):
            Circle(F0_R, mode=Mode.SUBTRACT)
        with BuildLine():
            Line((14, -14), (14, -21.0839202169))
            ThreePointArc((14, -21.0839202169), (15, -21), (16, -21.0839202169))
            Line((16, -21.0839202169), (16, -14))
            Line((16, -14), (14, -14))
        make_face()
        with BuildLine():
            ThreePointArc((74, -21.0839202169), (75, -21), (76, -21.0839202169))
            Line((76, -21.0839202169), (76, -14))
            Line((76, -14), (74, -14))
            Line((74, -14), (74, -21.0839202169))
        make_face()
        with Locations((45, -20.9553470761)):
            Circle(F0_R)
        with Locations((45, -20.9553470761)):
            Circle(F0_R_2, mode=Mode.SUBTRACT)
    extrude(amount=F14_DEPTH, mode=Mode.SUBTRACT)

    # F0 (on Top) → F15 (cut)
    with BuildSketch(Plane.XY):
        with Locations((45, -20.9553470761)):
            Circle(F0_R)
        with Locations((45, -20.9553470761)):
            Circle(F0_R_2, mode=Mode.SUBTRACT)
    extrude(amount=F15_DEPTH, mode=Mode.SUBTRACT)

    # F16 (on face) → F17 (cut)
    with BuildSketch(Plane.XZ.offset(40)):
        with Locations((28.83, 18.75)):
            Circle(F16_R)
        with Locations((61.17, 18.75)):
            Circle(F16_R)
    extrude(amount=-F17_DEPTH, mode=Mode.SUBTRACT)


solid = f1.part
